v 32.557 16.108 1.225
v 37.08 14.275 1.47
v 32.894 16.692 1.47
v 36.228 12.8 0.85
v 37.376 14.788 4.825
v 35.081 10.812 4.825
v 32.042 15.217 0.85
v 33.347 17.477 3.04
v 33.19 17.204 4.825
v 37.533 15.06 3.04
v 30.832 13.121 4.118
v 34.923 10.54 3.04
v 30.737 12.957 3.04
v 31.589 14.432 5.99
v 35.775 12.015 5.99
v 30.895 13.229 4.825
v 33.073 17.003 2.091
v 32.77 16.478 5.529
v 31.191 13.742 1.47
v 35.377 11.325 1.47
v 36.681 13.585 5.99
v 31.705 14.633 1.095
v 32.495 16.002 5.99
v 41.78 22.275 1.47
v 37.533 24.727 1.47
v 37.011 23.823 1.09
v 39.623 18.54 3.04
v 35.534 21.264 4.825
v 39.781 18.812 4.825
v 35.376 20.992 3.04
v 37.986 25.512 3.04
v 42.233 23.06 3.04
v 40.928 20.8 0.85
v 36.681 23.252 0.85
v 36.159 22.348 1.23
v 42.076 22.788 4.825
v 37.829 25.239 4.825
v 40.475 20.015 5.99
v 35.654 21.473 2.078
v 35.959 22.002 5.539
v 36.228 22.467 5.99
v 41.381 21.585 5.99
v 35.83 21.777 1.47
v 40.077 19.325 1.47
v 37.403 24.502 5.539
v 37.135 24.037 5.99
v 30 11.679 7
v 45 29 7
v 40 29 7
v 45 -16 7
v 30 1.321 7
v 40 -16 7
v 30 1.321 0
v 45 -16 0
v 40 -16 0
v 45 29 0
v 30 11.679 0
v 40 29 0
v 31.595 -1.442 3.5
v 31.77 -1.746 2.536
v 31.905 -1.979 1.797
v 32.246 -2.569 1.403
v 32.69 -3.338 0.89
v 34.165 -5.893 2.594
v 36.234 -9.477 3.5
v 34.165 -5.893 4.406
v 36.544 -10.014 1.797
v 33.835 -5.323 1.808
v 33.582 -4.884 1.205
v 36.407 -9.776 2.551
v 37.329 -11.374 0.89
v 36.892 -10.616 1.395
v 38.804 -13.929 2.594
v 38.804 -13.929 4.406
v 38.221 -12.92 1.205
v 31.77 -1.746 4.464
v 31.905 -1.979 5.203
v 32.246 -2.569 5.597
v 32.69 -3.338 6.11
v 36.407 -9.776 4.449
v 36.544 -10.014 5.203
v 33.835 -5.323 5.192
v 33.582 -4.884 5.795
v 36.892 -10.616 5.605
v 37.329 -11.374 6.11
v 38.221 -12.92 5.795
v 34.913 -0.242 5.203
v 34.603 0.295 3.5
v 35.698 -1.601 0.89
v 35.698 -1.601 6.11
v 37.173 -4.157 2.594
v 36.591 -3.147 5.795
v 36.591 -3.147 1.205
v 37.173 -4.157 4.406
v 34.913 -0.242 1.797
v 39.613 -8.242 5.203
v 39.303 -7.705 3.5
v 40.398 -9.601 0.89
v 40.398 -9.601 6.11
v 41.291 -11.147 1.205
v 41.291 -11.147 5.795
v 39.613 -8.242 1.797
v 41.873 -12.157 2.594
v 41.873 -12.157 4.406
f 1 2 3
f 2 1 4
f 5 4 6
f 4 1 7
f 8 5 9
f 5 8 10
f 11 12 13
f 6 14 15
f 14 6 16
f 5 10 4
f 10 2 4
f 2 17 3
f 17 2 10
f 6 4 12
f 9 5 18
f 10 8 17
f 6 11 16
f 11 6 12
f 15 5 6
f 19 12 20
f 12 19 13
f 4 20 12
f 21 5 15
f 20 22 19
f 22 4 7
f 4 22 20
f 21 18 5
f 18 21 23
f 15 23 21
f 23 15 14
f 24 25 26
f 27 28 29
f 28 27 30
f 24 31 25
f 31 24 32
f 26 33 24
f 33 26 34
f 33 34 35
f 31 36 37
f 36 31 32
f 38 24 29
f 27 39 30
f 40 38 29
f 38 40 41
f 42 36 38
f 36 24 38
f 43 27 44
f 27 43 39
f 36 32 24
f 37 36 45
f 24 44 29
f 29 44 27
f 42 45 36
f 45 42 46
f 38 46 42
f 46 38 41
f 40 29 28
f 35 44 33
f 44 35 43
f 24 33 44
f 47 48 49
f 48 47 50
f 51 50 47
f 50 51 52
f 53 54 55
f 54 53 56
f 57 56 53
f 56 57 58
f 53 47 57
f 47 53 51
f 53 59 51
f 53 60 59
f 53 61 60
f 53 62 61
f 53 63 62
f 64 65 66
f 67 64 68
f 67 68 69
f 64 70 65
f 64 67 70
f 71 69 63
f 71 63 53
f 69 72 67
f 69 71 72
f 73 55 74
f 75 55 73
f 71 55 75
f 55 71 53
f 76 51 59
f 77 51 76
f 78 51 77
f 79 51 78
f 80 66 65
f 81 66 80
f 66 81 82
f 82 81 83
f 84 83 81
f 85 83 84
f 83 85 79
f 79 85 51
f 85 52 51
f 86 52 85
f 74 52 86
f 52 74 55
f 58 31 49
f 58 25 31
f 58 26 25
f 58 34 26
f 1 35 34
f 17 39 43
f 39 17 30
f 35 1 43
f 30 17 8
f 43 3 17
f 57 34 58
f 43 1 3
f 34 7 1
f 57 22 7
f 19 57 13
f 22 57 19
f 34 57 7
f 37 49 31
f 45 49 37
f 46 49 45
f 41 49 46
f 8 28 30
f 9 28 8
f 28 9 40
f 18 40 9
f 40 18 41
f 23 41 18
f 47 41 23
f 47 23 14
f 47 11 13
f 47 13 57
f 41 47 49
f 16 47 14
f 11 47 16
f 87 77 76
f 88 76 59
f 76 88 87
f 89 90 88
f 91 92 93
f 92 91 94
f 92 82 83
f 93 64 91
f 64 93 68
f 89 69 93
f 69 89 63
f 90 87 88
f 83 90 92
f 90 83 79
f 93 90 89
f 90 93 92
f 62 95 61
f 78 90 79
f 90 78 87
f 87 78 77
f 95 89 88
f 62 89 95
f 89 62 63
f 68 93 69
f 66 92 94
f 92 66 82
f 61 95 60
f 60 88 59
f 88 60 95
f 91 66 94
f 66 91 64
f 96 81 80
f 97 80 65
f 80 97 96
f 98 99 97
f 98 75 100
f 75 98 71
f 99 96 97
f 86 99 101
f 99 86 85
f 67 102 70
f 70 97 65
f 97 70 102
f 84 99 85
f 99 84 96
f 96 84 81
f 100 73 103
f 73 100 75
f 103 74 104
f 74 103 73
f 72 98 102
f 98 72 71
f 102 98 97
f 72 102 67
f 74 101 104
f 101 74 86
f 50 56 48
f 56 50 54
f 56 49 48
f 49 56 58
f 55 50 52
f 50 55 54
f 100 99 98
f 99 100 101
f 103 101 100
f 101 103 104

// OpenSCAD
z=7; //высота
g=3.5; //глубина дырок 
//фосфор
translate ([25,-46,0]) {
difference () {
translate ([5,30,0])cube ([10,45,z]);
translate ([-5,125,0]) {
translate ([9.3,-62.2,3.5])rotate([0,90,-30])cylinder (4.5+g,2.65,2.65);
translate ([14,-54.2,3.5])rotate([0,90,-30])cylinder (4.5+g,2.65,2.65);
}
translate([-5,30,-1])cylinder(z+2,20,20,$fn=6);
translate([-5,75,-1])cylinder(z+2,20,20,$fn=6);
translate ([4,40,g])rotate ([90,0,120])cylinder(4.5+g,2.65,2.65);   
translate ([4+4.7,37.5+-9+g,3.5])rotate ([90,0,120])cylinder(4.5+3.5,2.65,2.65); 
  }
//вырезание дырки из доп части от фосфра
difference () {
translate ([15,30,0])cube ([5,45,z]);
translate ([-5,125,0]) {
translate ([9.3,-62.2,3.5])rotate([0,90,-30])cylinder (4.5+g,2.65,2.65);
translate ([14,-54.2,3.5])rotate([0,90,-30])cylinder (4.5+g,2.65,2.65);
}
translate ([9.7-5,-9+g,0]) {
translate ([4,37.5,g])rotate ([90,0,120])cylinder(4.5+g,2.65,2.65); 
  }
 }
}
